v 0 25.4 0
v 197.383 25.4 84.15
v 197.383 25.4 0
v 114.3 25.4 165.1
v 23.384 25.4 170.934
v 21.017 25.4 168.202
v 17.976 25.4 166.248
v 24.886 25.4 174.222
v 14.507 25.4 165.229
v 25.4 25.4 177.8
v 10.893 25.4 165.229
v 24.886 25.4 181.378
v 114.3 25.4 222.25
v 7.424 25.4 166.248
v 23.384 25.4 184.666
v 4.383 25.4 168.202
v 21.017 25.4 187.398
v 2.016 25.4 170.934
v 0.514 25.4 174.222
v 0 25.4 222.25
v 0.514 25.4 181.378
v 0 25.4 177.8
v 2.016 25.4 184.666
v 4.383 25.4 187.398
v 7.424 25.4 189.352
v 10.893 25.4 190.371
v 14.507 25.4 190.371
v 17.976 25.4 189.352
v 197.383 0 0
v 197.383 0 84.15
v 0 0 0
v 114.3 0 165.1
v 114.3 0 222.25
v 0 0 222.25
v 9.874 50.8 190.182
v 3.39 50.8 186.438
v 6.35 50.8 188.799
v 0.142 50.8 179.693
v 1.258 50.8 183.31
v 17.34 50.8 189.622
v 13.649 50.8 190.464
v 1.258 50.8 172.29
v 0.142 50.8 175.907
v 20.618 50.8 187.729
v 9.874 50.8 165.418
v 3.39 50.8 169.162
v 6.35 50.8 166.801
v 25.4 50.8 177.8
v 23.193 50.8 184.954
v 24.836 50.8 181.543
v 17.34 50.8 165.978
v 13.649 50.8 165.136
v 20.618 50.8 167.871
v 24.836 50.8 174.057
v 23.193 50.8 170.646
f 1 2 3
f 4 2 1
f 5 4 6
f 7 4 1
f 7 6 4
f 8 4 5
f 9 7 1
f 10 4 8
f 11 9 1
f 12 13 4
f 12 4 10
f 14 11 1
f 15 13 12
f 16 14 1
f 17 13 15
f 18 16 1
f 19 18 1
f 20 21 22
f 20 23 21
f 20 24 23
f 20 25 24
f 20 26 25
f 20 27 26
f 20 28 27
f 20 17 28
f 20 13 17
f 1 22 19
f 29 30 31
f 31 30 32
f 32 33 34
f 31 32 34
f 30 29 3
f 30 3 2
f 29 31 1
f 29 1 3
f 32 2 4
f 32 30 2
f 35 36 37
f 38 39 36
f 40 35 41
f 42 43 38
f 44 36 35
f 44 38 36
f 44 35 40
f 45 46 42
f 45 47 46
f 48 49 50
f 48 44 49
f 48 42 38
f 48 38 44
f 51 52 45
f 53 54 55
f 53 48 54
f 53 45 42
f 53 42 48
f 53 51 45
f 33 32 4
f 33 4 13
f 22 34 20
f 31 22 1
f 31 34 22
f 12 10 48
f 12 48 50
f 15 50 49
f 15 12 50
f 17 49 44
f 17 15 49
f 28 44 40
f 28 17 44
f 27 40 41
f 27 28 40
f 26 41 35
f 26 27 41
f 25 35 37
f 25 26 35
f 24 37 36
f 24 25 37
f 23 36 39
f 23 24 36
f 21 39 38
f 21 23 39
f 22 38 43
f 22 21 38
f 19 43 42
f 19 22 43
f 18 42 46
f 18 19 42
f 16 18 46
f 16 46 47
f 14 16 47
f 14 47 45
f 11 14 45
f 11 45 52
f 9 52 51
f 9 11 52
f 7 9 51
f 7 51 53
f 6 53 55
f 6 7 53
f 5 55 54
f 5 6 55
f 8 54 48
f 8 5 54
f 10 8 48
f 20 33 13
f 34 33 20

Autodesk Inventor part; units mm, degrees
ref_plane "YZ Plane" through (0, 0, 0) normal (1, 0, 0) x (0, 1, 0)
ref_plane "XZ Plane" through (0, 0, 0) normal (0, 1, 0) x (-1, 0, 0)
ref_plane "XY Plane" through (0, 0, 0) normal (0, 0, 1) x (1, 0, 0)
sketch "Sketch1" plane through (0, 0, 0) normal (0, 1, 0) x (-1, 0, 0)
  line L0 (0, 0) -> (-197.3834, 0)
  line L1 (-197.3834, 0) -> (-197.3834, 84.1502)
  line L2 (-197.3834, 84.1502) -> (-114.3, 165.1)
  line L3 (-114.3, 165.1) -> (-114.3, 222.25)
  line L4 (-114.3, 222.25) -> (0, 222.25)
  line L5 (0, 222.25) -> (0, 0)
  dimension "d9" = 197.3834
  dimension "d10" = 222.25
  dimension "d11" = 84.1502
  dimension "d12" = 114.3
  dimension "d13" = 57.15
extrude "Extrusion1" add sketch "Sketch1" along normal blind 25.4
sketch "Sketch2" plane through (0, 25.4, 0) normal (0, 1, 0) x (1, 0, 0)
  circle A0 centre (12.7, -177.8) radius 12.7
  line L0 (0, -222.25) -> (114.3, -222.25) projected
  line L1 (0, 0) -> (0, -222.25) projected
  dimension "d14" = 44.45
  dimension "d15" = 25.4
  dimension "d16" = 12.7
extrude "Extrusion2" add sketch "Sketch2" along normal blind 25.4
properties part number "handmove"
